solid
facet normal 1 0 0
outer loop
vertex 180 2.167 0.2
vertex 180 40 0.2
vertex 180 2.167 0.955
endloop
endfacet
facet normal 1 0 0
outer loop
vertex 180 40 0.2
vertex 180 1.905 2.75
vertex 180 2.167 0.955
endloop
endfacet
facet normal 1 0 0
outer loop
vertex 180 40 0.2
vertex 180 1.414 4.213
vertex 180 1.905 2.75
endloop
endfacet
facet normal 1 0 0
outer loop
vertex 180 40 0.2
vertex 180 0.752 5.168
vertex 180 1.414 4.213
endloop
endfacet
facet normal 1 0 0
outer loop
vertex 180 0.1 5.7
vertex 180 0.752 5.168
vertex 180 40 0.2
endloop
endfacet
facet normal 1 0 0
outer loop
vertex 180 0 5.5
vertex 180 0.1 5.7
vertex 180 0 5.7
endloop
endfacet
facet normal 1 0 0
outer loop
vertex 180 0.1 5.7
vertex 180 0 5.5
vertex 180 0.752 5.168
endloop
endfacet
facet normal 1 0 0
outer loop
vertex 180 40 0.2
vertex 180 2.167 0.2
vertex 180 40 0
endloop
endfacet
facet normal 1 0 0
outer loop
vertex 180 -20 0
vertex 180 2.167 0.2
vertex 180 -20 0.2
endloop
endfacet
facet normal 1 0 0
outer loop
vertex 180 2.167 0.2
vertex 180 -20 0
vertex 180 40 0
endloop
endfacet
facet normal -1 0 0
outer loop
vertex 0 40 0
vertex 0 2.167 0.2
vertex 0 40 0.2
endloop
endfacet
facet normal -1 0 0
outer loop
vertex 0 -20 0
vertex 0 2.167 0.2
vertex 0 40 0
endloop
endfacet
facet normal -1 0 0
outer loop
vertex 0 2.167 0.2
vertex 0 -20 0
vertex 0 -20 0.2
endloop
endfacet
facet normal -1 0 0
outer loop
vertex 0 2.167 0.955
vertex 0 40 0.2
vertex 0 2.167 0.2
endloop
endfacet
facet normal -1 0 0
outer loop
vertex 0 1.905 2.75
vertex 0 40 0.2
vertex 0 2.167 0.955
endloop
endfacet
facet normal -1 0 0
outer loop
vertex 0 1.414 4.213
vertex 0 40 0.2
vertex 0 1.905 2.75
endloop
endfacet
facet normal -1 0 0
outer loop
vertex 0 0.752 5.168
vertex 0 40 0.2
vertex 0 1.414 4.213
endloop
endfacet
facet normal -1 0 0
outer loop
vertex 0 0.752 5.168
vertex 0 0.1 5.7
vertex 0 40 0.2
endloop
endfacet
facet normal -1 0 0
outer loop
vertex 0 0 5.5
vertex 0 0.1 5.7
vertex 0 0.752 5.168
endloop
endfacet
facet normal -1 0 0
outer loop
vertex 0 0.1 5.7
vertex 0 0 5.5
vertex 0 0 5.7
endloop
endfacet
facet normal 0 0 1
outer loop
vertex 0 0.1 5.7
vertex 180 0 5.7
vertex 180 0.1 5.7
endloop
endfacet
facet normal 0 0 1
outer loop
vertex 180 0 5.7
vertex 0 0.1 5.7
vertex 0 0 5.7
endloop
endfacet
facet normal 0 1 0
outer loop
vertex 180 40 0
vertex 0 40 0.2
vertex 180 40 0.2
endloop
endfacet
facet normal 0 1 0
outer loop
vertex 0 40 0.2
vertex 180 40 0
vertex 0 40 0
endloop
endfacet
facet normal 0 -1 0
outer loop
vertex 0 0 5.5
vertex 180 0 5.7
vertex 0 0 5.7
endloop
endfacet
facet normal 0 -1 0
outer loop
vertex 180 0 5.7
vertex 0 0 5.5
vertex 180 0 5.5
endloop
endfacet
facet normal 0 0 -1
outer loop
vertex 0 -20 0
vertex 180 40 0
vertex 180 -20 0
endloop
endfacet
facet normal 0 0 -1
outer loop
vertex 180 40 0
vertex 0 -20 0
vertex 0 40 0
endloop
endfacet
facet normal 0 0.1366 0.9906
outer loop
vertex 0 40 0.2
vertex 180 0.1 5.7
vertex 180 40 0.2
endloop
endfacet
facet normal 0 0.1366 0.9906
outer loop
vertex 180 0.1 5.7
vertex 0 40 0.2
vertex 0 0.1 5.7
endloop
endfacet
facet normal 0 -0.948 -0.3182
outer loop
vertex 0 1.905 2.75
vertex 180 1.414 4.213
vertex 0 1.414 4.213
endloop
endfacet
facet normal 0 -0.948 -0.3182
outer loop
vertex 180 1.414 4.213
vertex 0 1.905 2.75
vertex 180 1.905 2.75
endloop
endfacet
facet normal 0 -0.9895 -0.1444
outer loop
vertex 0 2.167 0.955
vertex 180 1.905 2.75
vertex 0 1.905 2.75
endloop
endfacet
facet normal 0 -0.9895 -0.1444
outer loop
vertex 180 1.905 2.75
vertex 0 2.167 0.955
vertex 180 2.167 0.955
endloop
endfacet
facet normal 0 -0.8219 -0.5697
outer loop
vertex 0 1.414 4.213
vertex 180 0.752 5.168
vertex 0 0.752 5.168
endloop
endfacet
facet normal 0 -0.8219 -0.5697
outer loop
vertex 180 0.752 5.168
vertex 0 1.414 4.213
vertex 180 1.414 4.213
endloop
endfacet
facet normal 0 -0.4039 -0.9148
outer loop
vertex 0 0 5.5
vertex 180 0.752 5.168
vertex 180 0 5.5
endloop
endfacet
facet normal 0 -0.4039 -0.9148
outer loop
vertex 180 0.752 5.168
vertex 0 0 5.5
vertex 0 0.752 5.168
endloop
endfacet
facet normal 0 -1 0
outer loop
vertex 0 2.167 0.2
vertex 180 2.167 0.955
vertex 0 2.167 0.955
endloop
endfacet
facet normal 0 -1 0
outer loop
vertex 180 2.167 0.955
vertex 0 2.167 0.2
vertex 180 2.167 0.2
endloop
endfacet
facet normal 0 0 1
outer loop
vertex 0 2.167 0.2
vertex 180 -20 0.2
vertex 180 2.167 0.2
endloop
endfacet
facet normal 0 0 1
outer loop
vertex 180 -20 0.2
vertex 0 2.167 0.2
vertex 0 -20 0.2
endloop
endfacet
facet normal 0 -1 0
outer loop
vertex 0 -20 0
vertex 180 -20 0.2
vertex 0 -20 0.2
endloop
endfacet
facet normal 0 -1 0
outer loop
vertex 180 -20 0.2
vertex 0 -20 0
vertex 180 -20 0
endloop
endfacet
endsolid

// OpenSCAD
base=0.2;
grip=20;
ramp=40;
ramp_h=5.5;
w=180;
ramp_base=[w,ramp,base];
ramp_top=[w,0.1,base];
grip_cube=[w,grip+ramp,base];
pad=0.1;

difference() {
    hull() {
        cube(ramp_base);
        translate([0,0,ramp_h])
        cube(ramp_top);
    }
    translate([-pad,0,0])
    scale([1,0.4,1])
    rotate([0,90,0])
    cylinder(r=ramp_h,h=w+pad*2);
}

translate([0,-grip,0])
cube(grip_cube);
